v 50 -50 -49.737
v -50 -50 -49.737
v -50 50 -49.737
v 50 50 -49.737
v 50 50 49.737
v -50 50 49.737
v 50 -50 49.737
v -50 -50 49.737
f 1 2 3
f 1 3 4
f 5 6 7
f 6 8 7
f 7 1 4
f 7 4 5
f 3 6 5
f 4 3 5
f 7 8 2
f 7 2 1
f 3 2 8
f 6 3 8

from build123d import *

# Parameters (mm, degrees)
F0_W     = 100
F0_H     = 99.4736854108
F1_DEPTH = 50
F0_W_2   = 99.9998
F0_H_2   = 12.63157548


with BuildPart() as f1:
    # F0 (on Front) → F1 (new body, symmetric)
    with BuildSketch(Plane.XZ):
        Rectangle(F0_W, F0_H)
    extrude(amount=F1_DEPTH, both=True)


with BuildPart() as f1b:
    # F0 (on Front) → F1, piece 2 (new body, symmetric)
    with BuildSketch(Plane.XZ):
        with Locations((0, 60.2631566611)):
            Rectangle(F0_W_2, F0_H_2)
    extrude(amount=F1_DEPTH, both=True)


solid = f1.part
